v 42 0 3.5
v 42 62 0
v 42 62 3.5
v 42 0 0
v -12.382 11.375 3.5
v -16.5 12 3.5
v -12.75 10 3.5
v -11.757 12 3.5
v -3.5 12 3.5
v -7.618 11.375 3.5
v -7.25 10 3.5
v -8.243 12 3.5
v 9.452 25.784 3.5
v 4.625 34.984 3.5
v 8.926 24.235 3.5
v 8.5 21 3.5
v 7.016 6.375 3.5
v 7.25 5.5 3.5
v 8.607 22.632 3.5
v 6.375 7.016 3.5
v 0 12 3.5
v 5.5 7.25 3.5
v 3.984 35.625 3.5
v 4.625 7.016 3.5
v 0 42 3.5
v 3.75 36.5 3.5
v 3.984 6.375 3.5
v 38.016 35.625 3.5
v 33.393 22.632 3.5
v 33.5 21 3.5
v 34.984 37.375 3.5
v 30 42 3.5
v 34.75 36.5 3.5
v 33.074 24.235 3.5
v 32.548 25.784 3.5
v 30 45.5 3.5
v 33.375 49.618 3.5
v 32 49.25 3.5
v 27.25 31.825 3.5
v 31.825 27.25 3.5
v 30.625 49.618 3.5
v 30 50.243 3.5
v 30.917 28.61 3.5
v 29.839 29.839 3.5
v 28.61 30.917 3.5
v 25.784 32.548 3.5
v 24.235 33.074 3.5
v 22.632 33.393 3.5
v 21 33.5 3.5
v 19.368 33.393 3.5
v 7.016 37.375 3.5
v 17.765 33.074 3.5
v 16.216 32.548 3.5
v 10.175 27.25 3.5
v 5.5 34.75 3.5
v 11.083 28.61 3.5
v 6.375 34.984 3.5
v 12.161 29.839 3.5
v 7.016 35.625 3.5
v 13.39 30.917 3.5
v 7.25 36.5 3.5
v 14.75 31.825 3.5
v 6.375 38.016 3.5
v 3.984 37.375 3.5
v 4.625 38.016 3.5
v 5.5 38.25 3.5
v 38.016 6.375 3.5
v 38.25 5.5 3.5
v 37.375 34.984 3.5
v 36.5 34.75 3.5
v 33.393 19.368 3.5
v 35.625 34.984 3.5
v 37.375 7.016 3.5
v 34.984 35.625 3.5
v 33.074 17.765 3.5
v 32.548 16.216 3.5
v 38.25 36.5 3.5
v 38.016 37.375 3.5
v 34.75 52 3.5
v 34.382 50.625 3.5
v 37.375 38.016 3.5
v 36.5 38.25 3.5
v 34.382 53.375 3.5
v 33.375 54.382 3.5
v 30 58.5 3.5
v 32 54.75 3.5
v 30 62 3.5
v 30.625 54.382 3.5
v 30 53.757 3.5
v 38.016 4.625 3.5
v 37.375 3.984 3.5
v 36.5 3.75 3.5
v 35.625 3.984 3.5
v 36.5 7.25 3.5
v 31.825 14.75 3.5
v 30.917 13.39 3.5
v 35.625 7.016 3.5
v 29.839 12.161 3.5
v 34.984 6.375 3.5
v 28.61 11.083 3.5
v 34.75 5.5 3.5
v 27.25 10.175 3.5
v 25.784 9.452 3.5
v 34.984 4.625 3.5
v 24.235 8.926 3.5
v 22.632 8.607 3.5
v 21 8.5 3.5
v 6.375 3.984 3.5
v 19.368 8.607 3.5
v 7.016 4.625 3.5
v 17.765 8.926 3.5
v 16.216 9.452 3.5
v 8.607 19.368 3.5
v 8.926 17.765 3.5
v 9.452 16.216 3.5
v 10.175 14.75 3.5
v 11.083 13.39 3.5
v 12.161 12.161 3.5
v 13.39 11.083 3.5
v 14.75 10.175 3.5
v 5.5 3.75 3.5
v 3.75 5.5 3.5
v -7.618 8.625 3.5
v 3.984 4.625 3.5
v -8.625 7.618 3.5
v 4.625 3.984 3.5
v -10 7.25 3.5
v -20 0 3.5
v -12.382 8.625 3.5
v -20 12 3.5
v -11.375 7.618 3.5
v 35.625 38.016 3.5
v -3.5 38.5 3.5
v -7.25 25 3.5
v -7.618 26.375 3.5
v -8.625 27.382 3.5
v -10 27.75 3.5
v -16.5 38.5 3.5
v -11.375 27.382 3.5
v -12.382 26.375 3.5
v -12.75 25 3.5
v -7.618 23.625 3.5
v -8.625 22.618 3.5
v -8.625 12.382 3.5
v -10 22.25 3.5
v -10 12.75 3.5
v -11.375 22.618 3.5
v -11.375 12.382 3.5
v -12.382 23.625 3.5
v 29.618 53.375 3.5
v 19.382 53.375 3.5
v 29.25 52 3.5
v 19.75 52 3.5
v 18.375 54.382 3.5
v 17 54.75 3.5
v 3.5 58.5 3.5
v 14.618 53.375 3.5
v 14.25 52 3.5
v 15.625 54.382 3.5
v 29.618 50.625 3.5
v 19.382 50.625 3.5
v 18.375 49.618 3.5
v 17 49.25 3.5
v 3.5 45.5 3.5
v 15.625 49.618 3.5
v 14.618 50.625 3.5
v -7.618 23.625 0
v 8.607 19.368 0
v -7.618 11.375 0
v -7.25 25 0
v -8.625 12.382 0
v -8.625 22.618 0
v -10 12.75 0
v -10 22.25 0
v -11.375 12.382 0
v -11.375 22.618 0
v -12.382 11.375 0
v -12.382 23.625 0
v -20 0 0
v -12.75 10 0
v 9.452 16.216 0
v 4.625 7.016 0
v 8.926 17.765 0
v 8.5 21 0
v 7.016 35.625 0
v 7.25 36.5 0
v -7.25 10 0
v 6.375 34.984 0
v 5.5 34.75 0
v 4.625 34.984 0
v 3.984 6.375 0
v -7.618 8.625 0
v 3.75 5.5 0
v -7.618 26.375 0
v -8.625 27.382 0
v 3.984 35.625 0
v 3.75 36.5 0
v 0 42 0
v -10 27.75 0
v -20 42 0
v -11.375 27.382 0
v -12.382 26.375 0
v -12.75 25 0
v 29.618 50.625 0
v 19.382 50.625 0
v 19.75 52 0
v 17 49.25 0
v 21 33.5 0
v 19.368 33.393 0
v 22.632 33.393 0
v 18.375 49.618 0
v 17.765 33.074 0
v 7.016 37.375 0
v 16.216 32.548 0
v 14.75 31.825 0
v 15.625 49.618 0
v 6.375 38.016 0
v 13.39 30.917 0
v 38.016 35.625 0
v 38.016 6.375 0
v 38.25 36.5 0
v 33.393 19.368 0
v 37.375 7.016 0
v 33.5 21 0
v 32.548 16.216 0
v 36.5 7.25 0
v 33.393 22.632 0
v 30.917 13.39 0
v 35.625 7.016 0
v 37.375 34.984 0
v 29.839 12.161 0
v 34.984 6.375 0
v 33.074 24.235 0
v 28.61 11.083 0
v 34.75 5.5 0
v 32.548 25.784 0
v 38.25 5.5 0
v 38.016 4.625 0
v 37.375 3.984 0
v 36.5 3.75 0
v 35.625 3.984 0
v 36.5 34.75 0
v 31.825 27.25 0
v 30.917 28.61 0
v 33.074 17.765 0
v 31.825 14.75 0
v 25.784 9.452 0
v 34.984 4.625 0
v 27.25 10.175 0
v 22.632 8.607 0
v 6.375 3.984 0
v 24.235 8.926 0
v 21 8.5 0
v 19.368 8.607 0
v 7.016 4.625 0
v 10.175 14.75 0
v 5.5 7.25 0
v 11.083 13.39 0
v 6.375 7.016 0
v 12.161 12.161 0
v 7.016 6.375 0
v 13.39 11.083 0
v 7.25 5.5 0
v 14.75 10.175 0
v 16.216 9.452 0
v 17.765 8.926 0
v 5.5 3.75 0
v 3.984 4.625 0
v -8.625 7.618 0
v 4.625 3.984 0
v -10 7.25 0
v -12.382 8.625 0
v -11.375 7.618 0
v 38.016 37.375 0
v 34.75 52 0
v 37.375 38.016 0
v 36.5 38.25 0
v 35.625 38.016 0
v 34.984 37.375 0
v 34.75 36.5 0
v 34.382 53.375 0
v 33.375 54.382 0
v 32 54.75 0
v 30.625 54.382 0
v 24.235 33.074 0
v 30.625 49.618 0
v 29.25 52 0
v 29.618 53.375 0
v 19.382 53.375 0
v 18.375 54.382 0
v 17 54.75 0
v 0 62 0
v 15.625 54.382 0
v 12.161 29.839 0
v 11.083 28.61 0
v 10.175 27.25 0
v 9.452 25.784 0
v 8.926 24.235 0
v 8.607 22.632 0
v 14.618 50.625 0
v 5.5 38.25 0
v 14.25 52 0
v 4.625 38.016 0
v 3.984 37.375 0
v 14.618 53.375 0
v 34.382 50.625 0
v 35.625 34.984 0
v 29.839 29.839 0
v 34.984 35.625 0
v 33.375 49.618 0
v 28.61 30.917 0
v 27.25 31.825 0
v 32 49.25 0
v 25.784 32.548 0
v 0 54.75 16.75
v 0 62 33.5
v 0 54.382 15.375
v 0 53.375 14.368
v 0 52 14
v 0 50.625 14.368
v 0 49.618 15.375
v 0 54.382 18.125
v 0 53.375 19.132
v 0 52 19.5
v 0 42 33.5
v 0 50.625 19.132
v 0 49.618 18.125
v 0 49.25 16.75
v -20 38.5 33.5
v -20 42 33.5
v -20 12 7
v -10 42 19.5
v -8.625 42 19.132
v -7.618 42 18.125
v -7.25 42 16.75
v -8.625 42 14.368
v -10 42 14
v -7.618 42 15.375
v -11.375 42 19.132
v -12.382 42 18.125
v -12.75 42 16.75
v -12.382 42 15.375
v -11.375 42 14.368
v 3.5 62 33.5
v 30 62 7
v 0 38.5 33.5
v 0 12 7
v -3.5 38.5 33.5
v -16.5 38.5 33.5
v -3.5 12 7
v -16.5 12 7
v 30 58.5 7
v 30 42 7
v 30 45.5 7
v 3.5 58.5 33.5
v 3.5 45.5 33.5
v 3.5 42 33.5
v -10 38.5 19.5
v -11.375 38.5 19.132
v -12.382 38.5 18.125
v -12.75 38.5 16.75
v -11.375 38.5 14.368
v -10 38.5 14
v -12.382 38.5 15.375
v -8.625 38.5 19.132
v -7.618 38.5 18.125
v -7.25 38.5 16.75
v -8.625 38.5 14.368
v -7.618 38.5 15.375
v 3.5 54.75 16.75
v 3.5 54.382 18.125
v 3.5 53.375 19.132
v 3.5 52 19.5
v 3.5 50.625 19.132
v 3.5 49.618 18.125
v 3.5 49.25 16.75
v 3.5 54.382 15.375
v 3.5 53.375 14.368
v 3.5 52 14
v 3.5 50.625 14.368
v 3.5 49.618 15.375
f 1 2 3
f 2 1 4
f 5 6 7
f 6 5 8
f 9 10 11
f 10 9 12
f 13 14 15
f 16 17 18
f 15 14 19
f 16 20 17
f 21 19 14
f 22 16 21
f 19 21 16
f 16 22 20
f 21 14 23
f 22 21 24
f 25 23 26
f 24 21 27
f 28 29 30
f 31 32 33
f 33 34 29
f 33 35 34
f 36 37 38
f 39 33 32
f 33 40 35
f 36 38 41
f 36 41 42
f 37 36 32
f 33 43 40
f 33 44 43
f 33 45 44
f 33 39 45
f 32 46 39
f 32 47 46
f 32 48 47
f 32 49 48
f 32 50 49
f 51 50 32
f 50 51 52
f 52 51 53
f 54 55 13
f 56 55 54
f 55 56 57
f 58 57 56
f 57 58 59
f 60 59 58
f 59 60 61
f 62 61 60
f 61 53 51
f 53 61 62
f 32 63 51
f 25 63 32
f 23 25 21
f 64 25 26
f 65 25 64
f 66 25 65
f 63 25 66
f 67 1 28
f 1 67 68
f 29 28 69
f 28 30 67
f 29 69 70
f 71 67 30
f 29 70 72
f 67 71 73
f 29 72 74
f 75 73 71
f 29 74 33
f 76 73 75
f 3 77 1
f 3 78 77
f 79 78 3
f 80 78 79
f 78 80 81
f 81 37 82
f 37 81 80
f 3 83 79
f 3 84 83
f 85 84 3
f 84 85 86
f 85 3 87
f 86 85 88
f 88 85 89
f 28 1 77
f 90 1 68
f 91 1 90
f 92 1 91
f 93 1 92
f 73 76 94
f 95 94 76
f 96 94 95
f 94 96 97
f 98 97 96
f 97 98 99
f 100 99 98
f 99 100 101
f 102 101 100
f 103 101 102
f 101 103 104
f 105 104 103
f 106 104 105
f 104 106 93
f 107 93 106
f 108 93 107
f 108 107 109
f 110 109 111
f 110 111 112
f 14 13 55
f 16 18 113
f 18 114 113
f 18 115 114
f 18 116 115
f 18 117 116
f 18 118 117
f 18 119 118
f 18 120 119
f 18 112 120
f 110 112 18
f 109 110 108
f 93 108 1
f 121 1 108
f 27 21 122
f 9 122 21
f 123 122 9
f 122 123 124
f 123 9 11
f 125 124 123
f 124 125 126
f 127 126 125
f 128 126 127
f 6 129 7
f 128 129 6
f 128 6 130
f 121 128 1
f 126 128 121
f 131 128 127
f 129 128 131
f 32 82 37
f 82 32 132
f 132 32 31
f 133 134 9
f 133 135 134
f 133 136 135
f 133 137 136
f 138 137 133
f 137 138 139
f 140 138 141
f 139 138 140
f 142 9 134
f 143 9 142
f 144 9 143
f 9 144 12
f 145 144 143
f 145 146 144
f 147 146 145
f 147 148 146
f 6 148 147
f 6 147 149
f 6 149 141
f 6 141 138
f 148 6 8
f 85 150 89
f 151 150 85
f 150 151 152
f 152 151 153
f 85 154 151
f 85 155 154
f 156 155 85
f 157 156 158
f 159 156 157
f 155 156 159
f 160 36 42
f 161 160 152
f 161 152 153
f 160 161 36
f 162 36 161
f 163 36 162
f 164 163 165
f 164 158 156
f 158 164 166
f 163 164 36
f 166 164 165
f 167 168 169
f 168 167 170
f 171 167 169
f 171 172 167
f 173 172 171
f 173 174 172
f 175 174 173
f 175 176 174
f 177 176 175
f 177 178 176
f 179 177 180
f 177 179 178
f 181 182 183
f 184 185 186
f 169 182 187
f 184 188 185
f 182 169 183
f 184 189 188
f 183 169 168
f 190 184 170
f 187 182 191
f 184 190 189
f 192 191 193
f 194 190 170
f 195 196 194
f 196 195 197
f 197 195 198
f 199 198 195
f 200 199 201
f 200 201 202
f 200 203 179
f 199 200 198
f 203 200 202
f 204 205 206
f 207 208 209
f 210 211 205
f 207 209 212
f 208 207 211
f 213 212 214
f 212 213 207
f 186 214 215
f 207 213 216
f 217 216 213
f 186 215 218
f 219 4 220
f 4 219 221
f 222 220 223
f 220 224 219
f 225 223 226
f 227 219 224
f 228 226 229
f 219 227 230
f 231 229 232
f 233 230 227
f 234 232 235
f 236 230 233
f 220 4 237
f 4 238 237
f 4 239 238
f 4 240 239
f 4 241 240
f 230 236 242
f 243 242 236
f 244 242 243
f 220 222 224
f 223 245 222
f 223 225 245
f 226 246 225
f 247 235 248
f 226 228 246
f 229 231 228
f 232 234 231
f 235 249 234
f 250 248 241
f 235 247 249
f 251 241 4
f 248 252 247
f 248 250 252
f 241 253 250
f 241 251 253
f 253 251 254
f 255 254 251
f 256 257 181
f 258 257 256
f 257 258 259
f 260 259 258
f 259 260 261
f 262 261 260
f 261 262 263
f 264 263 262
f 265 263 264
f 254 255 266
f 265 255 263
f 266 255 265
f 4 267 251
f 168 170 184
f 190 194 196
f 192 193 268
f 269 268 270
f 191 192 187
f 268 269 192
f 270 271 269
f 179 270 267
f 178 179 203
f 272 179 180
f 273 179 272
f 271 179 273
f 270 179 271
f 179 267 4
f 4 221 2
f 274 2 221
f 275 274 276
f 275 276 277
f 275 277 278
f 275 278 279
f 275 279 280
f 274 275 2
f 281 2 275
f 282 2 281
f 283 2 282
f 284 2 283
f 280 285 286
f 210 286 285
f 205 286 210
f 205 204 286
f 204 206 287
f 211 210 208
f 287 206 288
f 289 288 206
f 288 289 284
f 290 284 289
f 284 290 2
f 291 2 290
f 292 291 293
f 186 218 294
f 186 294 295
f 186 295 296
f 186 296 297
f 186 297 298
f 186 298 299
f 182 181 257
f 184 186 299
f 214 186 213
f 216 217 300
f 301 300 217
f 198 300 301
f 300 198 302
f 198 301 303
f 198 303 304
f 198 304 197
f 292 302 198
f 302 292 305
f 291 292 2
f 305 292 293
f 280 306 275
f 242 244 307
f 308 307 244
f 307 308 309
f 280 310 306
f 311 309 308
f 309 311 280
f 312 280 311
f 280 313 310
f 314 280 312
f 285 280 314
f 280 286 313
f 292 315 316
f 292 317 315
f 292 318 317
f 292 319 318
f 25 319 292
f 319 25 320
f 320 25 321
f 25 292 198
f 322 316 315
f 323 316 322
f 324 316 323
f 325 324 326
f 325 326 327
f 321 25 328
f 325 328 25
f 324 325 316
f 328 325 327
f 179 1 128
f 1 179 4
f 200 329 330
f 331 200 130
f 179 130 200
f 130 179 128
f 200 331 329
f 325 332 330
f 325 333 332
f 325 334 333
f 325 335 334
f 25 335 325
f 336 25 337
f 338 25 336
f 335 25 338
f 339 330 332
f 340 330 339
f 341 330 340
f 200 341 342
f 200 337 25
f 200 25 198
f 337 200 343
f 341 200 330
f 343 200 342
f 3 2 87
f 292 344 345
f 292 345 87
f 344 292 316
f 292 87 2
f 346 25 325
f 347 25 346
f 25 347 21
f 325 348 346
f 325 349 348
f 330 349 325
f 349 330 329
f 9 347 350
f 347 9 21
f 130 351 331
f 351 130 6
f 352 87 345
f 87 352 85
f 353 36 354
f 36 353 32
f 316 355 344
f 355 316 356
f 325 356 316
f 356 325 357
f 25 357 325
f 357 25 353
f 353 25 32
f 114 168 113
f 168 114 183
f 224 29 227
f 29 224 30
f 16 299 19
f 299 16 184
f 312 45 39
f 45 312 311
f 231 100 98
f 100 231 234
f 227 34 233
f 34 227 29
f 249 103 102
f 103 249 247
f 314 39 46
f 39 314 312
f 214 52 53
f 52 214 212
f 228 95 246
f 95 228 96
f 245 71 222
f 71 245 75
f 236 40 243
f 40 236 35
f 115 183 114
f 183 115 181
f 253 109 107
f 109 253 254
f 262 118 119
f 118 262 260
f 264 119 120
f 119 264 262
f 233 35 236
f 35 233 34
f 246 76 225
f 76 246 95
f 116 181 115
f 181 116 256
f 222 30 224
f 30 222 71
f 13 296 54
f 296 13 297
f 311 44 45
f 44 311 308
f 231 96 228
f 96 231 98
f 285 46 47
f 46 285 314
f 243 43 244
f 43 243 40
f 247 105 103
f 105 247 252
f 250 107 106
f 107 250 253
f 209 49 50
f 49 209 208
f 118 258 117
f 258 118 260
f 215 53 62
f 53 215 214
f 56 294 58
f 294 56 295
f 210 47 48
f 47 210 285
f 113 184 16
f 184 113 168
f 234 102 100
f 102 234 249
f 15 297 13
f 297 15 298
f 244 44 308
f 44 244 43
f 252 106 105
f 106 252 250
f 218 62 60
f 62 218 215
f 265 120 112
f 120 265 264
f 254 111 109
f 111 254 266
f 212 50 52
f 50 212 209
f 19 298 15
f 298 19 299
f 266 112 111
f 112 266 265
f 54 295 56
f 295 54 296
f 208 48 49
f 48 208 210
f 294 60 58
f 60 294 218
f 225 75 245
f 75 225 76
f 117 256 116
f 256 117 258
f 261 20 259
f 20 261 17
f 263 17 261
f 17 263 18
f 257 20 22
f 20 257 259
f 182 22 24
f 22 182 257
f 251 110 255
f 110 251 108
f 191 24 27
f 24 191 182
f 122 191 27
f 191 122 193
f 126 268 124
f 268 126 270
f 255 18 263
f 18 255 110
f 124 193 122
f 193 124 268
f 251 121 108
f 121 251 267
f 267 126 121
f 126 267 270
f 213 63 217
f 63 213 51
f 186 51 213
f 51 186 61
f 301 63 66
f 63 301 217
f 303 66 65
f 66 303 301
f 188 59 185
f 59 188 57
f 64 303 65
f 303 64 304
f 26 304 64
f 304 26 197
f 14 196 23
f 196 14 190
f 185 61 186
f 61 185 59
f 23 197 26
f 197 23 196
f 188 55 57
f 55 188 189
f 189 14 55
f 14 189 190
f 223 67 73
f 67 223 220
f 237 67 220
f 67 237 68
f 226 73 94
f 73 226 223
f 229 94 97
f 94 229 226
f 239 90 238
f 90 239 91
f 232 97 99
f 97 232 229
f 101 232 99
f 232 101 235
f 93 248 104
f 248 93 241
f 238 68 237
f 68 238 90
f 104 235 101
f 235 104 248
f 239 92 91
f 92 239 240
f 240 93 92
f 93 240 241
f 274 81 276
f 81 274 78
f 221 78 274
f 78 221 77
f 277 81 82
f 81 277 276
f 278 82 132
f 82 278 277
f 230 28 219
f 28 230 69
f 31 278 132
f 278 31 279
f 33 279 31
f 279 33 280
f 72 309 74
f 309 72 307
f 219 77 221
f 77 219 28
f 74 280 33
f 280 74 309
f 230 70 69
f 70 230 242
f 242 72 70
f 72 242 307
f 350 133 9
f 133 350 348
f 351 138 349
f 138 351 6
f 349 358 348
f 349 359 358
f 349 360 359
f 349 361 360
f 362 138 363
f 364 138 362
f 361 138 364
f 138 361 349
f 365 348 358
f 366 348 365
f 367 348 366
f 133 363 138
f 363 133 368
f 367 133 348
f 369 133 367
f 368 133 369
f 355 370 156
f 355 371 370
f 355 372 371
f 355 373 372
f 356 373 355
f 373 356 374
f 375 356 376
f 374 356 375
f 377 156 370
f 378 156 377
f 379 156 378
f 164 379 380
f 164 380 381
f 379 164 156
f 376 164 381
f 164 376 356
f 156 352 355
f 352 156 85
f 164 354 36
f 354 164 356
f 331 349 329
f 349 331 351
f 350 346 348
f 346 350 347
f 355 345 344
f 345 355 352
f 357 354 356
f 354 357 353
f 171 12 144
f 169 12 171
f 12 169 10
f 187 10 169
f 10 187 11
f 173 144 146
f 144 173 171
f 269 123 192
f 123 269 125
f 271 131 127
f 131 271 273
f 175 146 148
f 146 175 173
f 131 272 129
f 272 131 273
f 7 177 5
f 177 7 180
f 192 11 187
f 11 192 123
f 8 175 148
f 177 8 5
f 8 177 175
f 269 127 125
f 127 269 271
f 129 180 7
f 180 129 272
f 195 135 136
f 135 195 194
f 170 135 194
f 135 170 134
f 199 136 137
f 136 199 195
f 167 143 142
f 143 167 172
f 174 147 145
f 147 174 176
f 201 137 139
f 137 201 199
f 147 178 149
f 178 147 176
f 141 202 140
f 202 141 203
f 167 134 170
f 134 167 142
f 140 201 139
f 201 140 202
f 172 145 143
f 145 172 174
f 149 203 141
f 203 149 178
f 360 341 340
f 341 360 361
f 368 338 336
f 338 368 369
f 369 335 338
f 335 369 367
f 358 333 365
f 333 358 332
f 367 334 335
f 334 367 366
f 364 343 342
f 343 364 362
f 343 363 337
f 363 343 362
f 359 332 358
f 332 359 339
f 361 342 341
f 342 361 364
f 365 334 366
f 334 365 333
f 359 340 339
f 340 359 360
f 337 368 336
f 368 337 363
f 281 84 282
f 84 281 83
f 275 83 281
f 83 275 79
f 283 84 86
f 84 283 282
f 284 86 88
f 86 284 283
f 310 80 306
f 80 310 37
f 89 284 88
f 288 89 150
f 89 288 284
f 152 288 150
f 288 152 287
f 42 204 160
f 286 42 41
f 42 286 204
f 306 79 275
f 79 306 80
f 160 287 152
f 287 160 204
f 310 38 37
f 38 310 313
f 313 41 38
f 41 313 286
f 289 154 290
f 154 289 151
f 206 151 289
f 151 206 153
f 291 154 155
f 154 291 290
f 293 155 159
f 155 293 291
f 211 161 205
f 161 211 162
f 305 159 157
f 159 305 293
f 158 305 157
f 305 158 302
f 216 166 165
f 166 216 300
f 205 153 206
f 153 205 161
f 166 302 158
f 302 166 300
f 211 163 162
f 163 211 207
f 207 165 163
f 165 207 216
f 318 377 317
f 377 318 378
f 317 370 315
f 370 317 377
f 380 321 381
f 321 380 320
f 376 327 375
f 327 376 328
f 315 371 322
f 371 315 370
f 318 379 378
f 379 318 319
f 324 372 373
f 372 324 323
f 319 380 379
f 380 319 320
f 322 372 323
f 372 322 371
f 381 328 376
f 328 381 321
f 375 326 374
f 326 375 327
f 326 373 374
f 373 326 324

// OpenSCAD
t=3.5;

difference()
{
    union()
    {
        cube([42,42,t]);
        
        translate([-20,0,0])
            cube([20,42,t]);
        translate([0,42,0])
            cube([42,20,t]);
        
        translate([-20,12,t])
            cube([20,30,30]);
        translate([0,42,t])
            cube([30,20,30]);
    }
    
    union()
    {
        translate([21,21,0])
            cylinder(d=25,h=t,$fn=48);
        
        translate([21-31/2,21-31/2,0])
            cylinder(d=3.5,h=t,$fn=12);
        translate([21-31/2,21+31/2,0])
            cylinder(d=3.5,h=t,$fn=12);
        translate([21+31/2,21-31/2,0])
            cylinder(d=3.5,h=t,$fn=12);
        translate([21+31/2,21+31/2,0])
            cylinder(d=3.5,h=t,$fn=12);
        
        translate([-20+t,12,t])
            cube([20-t*2,30-t,30]);
        translate([0+t,42+t,t])
            cube([30-t,20-t*2,30]);
        
        translate([-20,12,t+t])
            rotate([45,0,0])
                cube([20,30*sqrt(2),3030*sqrt(2)]);
        translate([30,42,t+t])
            rotate([0,45+270,0])
                cube([30*sqrt(2),20,30*sqrt(2)]);
        
        translate([-10,10,0])
            cylinder(d=5.5,h=t,$fn=12);
        translate([-10,25,0])
            cylinder(d=5.5,h=t,$fn=12);
        translate([-10,42-t,t+(30-t)/2])
            rotate([270,0,0])
                cylinder(d=5.5,h=t,$fn=12);
        
        translate([42-10,42+10,0])
            cylinder(d=5.5,h=t,$fn=12);
        translate([42-25,42+10,0])
            cylinder(d=5.5,h=t,$fn=12);
        translate([0,42+10,t+(30-t)/2])
            rotate([0,90,0])
                cylinder(d=5.5,h=t+1,$fn=12);
    }
}
